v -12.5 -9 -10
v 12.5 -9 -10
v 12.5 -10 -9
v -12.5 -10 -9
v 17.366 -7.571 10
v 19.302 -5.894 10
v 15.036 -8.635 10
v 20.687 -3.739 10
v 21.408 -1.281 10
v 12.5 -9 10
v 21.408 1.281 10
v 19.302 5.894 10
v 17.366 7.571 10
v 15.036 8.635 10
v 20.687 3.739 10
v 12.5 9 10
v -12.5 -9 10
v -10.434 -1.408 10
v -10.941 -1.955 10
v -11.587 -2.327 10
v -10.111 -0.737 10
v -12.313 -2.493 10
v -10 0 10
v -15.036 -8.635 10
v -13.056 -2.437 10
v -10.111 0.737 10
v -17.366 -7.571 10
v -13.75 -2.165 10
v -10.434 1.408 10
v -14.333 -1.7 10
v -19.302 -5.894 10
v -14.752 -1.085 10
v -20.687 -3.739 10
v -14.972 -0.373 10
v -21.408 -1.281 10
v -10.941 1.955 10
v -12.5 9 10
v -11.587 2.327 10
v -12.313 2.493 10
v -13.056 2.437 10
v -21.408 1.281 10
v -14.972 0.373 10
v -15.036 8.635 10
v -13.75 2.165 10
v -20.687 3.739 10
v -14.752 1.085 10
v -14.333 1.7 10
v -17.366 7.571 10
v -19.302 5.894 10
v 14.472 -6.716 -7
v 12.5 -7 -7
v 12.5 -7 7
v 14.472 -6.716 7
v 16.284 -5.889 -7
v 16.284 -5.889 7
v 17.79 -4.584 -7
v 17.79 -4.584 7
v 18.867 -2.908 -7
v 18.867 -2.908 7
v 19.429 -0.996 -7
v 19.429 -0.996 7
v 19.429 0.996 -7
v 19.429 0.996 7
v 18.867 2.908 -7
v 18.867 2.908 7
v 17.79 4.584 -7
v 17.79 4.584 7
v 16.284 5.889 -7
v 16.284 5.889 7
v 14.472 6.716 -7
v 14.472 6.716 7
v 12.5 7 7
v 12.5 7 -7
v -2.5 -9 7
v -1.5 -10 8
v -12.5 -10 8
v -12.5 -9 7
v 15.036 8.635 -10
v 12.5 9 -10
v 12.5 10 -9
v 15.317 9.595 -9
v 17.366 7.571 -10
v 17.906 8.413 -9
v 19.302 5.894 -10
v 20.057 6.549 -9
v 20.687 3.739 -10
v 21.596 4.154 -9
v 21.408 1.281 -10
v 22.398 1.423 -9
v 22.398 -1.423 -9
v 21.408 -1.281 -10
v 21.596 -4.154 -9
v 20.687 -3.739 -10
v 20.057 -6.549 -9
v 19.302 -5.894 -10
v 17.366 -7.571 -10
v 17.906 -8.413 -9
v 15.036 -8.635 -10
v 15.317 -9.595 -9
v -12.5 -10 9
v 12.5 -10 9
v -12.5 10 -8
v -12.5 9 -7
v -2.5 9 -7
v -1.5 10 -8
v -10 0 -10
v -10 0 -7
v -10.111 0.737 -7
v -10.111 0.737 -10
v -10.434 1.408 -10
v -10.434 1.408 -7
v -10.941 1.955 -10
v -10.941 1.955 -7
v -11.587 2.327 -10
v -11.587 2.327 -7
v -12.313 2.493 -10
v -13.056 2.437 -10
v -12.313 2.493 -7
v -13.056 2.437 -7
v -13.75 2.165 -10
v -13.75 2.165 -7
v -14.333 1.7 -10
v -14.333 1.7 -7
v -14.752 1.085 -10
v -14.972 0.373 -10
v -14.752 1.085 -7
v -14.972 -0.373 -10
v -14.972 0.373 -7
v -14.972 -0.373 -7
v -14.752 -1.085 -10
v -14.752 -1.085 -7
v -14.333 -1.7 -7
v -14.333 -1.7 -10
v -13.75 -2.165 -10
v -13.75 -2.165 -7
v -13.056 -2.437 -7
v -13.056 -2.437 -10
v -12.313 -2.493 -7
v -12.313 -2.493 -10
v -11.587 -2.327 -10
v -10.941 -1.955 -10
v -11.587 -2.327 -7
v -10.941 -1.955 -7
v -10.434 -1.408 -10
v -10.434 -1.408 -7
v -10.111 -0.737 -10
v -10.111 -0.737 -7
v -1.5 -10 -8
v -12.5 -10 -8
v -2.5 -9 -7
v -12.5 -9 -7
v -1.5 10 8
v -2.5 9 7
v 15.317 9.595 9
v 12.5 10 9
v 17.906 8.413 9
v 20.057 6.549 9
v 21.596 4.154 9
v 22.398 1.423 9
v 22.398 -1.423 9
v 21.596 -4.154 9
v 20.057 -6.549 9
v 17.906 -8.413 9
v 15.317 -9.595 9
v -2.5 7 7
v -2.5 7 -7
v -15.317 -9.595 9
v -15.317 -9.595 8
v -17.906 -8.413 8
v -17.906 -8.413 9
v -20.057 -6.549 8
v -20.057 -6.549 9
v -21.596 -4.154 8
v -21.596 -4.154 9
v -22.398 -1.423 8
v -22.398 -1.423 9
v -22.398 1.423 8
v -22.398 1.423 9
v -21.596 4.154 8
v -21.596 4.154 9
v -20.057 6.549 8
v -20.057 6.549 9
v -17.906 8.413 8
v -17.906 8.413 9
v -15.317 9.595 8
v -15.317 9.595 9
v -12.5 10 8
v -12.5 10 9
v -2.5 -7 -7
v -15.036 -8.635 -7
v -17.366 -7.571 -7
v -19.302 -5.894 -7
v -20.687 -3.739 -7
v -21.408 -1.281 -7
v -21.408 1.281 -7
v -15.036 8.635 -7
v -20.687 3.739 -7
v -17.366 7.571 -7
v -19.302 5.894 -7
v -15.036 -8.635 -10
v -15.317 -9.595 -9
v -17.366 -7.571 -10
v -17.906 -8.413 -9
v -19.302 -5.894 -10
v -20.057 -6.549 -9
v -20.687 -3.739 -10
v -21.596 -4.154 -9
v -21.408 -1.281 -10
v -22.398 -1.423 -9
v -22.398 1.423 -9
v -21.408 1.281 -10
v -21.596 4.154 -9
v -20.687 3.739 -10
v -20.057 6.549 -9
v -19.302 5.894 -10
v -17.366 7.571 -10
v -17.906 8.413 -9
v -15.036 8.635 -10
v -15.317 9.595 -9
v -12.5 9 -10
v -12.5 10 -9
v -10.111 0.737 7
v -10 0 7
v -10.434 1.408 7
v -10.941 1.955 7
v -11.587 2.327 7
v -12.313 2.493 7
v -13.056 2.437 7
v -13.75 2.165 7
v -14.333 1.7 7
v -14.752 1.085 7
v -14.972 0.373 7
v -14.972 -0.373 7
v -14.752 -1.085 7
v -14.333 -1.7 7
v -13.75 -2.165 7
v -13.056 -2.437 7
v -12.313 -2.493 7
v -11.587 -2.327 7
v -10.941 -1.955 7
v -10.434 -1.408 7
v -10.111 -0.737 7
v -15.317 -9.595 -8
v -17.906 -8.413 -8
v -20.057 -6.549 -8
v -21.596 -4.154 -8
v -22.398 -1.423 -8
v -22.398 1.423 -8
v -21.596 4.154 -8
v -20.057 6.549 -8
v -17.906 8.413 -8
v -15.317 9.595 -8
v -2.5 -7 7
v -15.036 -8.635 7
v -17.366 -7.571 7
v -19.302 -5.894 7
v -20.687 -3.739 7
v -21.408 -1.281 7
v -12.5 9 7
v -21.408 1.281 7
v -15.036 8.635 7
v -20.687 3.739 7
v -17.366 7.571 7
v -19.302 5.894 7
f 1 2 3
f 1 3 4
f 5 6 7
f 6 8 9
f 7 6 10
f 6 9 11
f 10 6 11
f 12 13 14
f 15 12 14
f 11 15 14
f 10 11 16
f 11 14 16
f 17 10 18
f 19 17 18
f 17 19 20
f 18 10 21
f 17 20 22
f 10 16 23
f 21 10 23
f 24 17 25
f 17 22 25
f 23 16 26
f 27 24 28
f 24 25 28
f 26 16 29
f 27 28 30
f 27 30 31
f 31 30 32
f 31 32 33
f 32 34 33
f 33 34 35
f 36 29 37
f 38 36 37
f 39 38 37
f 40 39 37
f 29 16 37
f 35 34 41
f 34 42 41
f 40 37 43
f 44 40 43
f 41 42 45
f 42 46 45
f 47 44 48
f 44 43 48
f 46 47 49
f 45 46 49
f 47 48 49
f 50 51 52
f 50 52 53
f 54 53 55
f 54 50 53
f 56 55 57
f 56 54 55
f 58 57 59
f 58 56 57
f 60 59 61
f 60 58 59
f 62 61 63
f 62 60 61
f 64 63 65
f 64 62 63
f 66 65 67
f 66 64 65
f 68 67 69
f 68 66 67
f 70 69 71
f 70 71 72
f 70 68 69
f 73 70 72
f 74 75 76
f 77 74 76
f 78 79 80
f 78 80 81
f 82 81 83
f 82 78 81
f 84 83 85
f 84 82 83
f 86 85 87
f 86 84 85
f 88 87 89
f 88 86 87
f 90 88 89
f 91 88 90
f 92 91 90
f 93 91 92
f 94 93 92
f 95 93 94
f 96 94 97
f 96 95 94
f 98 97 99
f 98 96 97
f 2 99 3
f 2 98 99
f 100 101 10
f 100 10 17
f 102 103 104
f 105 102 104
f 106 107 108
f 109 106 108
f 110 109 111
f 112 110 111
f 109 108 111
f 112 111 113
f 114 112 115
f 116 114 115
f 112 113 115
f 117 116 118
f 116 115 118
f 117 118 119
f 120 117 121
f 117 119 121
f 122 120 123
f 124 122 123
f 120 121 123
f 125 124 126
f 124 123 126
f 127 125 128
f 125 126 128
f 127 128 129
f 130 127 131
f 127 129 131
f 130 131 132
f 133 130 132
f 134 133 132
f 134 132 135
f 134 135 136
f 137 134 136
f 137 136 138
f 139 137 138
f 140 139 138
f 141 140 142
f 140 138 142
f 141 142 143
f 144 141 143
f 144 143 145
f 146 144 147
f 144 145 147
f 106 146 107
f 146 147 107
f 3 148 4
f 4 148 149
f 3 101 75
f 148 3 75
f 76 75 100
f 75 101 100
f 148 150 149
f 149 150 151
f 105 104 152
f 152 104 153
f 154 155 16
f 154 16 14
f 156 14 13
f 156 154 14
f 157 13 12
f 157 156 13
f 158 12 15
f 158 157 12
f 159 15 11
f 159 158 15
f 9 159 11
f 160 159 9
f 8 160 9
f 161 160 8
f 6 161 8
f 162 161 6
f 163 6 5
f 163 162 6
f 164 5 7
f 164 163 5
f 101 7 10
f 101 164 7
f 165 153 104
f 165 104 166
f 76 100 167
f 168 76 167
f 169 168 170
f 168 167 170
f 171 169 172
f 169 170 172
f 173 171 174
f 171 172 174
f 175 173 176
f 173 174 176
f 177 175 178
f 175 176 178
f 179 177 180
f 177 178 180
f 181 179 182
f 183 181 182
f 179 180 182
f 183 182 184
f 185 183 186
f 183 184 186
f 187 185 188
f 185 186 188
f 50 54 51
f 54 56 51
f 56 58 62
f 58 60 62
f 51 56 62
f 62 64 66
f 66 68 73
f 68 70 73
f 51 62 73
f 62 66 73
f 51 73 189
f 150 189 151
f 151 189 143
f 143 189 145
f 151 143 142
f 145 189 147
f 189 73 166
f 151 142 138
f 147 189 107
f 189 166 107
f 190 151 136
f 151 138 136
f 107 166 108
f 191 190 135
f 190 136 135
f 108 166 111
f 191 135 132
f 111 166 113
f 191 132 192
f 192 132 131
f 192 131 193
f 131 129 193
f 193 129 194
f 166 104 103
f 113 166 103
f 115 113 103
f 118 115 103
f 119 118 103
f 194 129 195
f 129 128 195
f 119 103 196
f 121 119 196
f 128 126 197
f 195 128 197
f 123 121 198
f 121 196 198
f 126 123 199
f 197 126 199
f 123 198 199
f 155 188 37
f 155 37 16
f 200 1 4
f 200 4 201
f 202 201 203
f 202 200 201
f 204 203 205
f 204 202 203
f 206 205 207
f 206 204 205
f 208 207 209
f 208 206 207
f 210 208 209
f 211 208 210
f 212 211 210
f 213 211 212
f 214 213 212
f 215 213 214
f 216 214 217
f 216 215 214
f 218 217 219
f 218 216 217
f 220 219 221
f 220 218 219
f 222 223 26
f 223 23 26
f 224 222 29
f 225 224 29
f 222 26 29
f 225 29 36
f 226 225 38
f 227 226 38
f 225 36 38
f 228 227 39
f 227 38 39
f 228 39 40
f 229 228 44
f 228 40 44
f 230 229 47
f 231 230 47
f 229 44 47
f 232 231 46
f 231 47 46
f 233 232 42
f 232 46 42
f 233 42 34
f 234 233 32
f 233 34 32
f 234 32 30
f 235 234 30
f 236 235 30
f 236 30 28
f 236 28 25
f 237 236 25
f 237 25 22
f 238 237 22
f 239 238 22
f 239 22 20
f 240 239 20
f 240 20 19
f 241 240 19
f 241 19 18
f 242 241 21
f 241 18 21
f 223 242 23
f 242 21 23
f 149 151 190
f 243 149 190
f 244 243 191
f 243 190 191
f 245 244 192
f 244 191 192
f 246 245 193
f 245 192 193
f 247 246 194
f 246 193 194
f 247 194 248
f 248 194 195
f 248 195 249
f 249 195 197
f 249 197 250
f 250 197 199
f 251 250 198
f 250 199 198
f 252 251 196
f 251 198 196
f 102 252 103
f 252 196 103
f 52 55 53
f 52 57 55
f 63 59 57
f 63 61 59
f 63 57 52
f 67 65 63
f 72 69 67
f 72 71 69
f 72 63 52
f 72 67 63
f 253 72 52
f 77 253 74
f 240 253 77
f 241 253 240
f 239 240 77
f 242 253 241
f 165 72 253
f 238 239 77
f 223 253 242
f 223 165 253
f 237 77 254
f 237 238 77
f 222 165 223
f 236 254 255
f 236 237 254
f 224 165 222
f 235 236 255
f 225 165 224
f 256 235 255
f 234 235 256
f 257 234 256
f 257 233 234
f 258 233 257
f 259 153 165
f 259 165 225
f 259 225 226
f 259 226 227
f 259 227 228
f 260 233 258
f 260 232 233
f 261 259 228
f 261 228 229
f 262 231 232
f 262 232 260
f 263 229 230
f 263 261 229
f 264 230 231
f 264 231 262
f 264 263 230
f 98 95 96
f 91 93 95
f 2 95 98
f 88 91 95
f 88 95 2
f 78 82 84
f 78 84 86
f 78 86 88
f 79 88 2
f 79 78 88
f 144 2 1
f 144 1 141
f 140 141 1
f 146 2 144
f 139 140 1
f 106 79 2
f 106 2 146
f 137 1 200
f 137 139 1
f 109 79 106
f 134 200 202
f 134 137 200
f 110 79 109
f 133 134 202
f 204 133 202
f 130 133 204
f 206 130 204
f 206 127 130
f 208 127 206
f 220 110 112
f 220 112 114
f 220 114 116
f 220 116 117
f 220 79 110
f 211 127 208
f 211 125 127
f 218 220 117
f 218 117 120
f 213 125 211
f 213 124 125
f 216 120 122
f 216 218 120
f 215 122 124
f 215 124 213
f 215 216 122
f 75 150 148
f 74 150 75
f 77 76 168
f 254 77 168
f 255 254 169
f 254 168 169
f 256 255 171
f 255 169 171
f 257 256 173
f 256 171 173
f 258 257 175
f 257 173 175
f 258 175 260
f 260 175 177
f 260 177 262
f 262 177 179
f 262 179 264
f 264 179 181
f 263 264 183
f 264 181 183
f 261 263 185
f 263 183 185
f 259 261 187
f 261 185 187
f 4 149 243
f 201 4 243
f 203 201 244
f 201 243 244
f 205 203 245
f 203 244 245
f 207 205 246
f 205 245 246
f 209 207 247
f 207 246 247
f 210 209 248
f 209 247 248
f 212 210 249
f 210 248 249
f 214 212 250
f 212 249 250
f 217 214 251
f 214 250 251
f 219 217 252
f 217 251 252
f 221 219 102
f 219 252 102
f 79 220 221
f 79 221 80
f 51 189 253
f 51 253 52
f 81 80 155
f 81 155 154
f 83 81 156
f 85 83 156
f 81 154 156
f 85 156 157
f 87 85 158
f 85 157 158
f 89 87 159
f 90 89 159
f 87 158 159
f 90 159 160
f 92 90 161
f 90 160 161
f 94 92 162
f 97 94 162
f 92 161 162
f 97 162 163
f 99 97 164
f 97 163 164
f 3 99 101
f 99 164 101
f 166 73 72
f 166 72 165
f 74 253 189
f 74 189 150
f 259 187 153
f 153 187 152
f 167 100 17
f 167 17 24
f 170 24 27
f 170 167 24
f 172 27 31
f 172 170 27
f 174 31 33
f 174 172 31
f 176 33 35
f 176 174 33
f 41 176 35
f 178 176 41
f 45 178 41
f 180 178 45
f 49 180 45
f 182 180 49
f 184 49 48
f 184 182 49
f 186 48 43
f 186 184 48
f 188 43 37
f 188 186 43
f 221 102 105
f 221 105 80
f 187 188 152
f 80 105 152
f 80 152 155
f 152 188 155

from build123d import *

# Parameters (mm, degrees)
BOSS_EXTRUDE1_DEPTH = 10
CUT_EXTRUDE1_DEPTH  = 7
CHAMFER2_SIZE       = 1
CHAMFER3_SIZE       = 1
SKETCH3_R           = 2.5
CUT_EXTRUDE2_DEPTH  = 10
SHELL2_START        = -7
SHELL2_DEPTH        = 14
CHAMFER4_SIZE       = 1


# Read off the part's stored shape, not the designer's step: Shell2
with BuildPart() as part:
    # Sketch1 → Boss-Extrude1 (new, symmetric)
    with BuildSketch(Plane.XY):
        with BuildLine():
            Line((-12.5, 10), (12.5, 10))
            ThreePointArc((12.5, 10), (22.5, 0), (12.5, -10))
            Line((12.5, -10), (-12.5, -10))
            ThreePointArc((-12.5, -10), (-22.5, 0), (-12.5, 10))
        make_face()
    extrude(amount=BOSS_EXTRUDE1_DEPTH, both=True)

    # Sketch2 → Cut-Extrude1 (cut, symmetric)
    with BuildSketch(Plane.XY):
        with BuildLine():
            Line((-12.5, 10), (-2.5, 10))
            Line((-2.5, 10), (-2.5, -10))
            Line((-2.5, -10), (-12.5, -10))
            ThreePointArc((-12.5, -10), (-22.5, 0), (-12.5, 10))
        make_face()
    extrude(amount=CUT_EXTRUDE1_DEPTH, both=True, mode=Mode.SUBTRACT)

    # Chamfer2
    chamfer2_edges = [part.edges().sort_by_distance(p)[0] for p in [
        (-22.5, 0, -7),
        (-7.5, 10, -7),
        (-7.5, -10, -7),
        (-22.5, 0, 7),
        (-7.5, -10, 7),
        (-7.5, 10, 7),
    ]]
    chamfer(chamfer2_edges, length=CHAMFER2_SIZE)

    # Chamfer3
    chamfer3_edges = [part.edges().sort_by_distance(p)[0] for p in [
        (22.5, 0, 10),
        (0, 10, 10),
        (-22.5, 0, 10),
        (0, 10, -10),
        (22.5, 0, -10),
        (0, -10, -10),
        (-22.5, 0, -10),
        (0, -10, 10),
    ]]
    chamfer(chamfer3_edges, length=CHAMFER3_SIZE)

    # Sketch3 → Cut-Extrude2 (cut, symmetric)
    with BuildSketch(Plane.XY):
        with Locations((-12.5, 0)):
            Circle(SKETCH3_R)
    extrude(amount=CUT_EXTRUDE2_DEPTH, both=True, mode=Mode.SUBTRACT)

    # Shell2 outline → Shell2 (cut)
    with BuildSketch(Plane.XY.offset(SHELL2_START)):
        with BuildLine():
            Line((12.5, 7), (-2.5, 7))
            Line((-2.5, 7), (-2.5, -7))
            Line((-2.5, -7), (12.5, -7))
            ThreePointArc((12.5, -7), (19.5, 0), (12.5, 7))
        make_face()
    extrude(amount=SHELL2_DEPTH, mode=Mode.SUBTRACT)

    # Chamfer4
    chamfer4_edges = [part.edges().sort_by_distance(p)[0] for p in [
        (-2.5, -10, 0),
        (-2.5, 10, 0),
    ]]
    chamfer(chamfer4_edges, length=CHAMFER4_SIZE)


solid = part.part
